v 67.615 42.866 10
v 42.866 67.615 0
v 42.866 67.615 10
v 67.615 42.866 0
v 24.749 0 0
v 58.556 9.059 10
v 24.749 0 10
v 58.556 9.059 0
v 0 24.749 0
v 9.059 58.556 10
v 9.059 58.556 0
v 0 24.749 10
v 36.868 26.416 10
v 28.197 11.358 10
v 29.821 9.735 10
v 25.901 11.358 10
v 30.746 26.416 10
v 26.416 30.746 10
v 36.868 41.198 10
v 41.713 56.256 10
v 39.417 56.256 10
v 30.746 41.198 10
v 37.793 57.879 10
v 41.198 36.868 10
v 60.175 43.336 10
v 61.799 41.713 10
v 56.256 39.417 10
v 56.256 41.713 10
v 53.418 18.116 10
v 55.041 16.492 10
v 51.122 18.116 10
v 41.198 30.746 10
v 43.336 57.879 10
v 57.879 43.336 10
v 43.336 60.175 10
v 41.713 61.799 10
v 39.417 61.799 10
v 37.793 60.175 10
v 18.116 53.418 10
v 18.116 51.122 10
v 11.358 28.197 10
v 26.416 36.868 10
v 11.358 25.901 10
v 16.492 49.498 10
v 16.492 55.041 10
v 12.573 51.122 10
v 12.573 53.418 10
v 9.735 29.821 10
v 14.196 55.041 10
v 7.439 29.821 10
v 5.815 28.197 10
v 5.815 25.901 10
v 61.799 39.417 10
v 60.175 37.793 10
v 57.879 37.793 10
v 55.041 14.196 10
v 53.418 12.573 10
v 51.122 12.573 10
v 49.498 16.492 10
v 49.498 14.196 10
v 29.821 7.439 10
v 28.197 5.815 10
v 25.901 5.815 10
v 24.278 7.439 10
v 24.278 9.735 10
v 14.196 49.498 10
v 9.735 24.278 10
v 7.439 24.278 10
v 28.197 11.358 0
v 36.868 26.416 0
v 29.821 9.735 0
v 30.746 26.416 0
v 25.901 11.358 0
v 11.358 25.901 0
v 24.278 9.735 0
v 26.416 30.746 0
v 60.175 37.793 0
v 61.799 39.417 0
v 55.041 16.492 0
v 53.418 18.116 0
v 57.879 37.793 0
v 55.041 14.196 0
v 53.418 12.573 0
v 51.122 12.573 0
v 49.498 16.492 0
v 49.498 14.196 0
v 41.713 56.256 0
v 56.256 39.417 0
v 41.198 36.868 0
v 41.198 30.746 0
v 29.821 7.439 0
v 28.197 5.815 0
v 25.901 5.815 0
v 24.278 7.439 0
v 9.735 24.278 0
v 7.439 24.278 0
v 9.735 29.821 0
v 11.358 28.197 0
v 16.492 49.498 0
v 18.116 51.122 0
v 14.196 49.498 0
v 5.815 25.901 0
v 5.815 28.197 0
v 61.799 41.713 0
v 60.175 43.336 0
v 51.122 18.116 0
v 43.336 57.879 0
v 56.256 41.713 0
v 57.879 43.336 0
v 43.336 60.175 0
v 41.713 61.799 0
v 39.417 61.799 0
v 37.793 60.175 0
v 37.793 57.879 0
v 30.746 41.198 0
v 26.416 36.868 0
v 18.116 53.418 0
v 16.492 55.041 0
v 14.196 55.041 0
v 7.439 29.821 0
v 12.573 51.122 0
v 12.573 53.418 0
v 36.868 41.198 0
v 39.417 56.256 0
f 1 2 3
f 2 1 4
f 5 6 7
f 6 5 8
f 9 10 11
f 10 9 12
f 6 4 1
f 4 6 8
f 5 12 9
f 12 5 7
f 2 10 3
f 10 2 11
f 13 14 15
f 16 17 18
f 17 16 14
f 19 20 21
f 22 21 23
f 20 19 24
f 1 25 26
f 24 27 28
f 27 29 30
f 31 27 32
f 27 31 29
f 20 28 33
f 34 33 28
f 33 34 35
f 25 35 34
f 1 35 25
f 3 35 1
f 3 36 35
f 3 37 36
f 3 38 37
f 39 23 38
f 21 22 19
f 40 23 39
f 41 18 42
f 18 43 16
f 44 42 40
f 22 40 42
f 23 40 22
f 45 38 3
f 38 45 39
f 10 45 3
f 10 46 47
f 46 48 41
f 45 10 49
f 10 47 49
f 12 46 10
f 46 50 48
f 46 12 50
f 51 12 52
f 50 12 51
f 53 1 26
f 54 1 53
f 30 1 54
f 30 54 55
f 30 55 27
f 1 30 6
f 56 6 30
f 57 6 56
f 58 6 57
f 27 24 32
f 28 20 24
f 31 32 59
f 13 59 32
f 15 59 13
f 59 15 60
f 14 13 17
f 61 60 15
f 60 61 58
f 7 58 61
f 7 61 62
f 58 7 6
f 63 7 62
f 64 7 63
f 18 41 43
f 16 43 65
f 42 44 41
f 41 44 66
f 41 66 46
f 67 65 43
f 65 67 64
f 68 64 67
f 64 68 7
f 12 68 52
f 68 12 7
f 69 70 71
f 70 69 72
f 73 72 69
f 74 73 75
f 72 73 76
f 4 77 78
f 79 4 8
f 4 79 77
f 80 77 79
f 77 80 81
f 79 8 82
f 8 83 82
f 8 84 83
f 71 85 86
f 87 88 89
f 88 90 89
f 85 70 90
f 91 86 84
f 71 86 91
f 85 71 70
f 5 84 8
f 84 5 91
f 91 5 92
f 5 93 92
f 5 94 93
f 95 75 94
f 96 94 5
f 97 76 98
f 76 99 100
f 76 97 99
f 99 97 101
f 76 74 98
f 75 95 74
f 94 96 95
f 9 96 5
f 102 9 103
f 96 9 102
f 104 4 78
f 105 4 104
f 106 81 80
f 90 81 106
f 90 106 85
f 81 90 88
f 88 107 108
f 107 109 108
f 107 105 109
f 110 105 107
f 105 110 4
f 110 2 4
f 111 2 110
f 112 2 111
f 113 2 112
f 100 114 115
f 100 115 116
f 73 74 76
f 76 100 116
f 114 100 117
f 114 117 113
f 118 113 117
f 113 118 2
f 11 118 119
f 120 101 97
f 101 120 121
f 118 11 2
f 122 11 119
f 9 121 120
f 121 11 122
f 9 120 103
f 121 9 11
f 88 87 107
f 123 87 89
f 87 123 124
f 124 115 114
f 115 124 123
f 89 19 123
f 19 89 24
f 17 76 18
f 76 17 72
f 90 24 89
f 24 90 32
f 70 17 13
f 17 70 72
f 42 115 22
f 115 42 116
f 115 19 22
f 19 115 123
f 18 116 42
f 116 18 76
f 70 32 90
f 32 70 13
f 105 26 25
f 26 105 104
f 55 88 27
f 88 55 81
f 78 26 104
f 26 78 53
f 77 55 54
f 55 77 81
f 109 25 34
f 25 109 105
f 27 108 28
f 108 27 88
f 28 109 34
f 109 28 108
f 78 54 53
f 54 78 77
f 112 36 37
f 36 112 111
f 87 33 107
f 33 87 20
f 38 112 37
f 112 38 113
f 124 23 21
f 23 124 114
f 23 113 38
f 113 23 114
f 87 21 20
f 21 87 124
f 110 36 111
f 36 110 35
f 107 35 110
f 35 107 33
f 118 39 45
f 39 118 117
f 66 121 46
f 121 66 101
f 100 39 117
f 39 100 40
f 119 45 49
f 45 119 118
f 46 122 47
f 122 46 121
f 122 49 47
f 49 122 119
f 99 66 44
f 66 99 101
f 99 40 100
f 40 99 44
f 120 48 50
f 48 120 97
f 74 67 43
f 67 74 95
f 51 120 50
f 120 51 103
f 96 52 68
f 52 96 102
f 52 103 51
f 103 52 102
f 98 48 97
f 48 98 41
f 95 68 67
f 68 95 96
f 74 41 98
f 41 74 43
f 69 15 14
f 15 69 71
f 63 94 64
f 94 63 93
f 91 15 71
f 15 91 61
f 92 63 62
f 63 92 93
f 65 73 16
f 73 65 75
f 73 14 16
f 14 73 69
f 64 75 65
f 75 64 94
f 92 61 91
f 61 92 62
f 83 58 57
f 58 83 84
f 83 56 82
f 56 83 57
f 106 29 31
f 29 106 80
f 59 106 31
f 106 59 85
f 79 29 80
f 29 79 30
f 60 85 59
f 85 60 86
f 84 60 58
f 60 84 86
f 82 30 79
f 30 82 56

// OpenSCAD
$fn = 32;

// ----------------------------------------------------------------------
// Polygon plate: 6-gon R35, 6 bolt windows
// ----------------------------------------------------------------------

// --- parameters (mm) ---
sides = 6;                // number of polygon sides
plate_r = 35;             // circumscribed radius of the polygon
bore_r = 8;               // centre bore radius
bolts = 6;                // number of bolt windows
ring_r = 26.11;           // bolt-circle radius
bolt_r = 3;               // bolt window radius
plate_t = 10;             // plate thickness, Z (extrusion height)

plate_d = 2 * plate_r;  // circumscribed diameter
bore_d = 2 * bore_r;  // centre bore diameter
bolt_d = 2 * bolt_r;  // bolt window diameter
ring_d = 2 * ring_r;  // bolt-circle diameter

profile = [[67.615, 42.866], [42.866, 67.615], [9.059, 58.556], [0, 24.749], [24.749, 0], [58.556, 9.059]];  // primary outline, 6 points, counter clockwise
void_1 = [[41.198, 36.868], [36.868, 41.198], [30.746, 41.198], [26.416, 36.868], [26.416, 30.746], [30.746, 26.416], [36.868, 26.416], [41.198, 30.746]];  // centre bore, 8 points
void_2 = [[61.799, 41.713], [60.175, 43.336], [57.879, 43.336], [56.256, 41.713], [56.256, 39.417], [57.879, 37.793], [60.175, 37.793], [61.799, 39.417]];  // bolt window 1, 8 points
void_3 = [[43.336, 60.175], [41.713, 61.799], [39.417, 61.799], [37.793, 60.175], [37.793, 57.879], [39.417, 56.256], [41.713, 56.256], [43.336, 57.879]];  // bolt window 2, 8 points
void_4 = [[18.116, 53.418], [16.492, 55.041], [14.196, 55.041], [12.573, 53.418], [12.573, 51.122], [14.196, 49.498], [16.492, 49.498], [18.116, 51.122]];  // bolt window 3, 8 points
void_5 = [[11.358, 28.197], [9.735, 29.821], [7.439, 29.821], [5.815, 28.197], [5.815, 25.901], [7.439, 24.278], [9.735, 24.278], [11.358, 25.901]];  // bolt window 4, 8 points
void_6 = [[29.821, 9.735], [28.197, 11.358], [25.901, 11.358], [24.278, 9.735], [24.278, 7.439], [25.901, 5.815], [28.197, 5.815], [29.821, 7.439]];  // bolt window 5, 8 points
void_7 = [[55.041, 16.492], [53.418, 18.116], [51.122, 18.116], [49.498, 16.492], [49.498, 14.196], [51.122, 12.573], [53.418, 12.573], [55.041, 14.196]];  // bolt window 6, 8 points

// --- the one profile operation ---
difference() {
  linear_extrude(height = plate_t) polygon(points = profile);
  translate([0, 0, -1])
    linear_extrude(height = plate_t + 2) polygon(points = void_1);
  translate([0, 0, -1])
    linear_extrude(height = plate_t + 2) polygon(points = void_2);
  translate([0, 0, -1])
    linear_extrude(height = plate_t + 2) polygon(points = void_3);
  translate([0, 0, -1])
    linear_extrude(height = plate_t + 2) polygon(points = void_4);
  translate([0, 0, -1])
    linear_extrude(height = plate_t + 2) polygon(points = void_5);
  translate([0, 0, -1])
    linear_extrude(height = plate_t + 2) polygon(points = void_6);
  translate([0, 0, -1])
    linear_extrude(height = plate_t + 2) polygon(points = void_7);
}
